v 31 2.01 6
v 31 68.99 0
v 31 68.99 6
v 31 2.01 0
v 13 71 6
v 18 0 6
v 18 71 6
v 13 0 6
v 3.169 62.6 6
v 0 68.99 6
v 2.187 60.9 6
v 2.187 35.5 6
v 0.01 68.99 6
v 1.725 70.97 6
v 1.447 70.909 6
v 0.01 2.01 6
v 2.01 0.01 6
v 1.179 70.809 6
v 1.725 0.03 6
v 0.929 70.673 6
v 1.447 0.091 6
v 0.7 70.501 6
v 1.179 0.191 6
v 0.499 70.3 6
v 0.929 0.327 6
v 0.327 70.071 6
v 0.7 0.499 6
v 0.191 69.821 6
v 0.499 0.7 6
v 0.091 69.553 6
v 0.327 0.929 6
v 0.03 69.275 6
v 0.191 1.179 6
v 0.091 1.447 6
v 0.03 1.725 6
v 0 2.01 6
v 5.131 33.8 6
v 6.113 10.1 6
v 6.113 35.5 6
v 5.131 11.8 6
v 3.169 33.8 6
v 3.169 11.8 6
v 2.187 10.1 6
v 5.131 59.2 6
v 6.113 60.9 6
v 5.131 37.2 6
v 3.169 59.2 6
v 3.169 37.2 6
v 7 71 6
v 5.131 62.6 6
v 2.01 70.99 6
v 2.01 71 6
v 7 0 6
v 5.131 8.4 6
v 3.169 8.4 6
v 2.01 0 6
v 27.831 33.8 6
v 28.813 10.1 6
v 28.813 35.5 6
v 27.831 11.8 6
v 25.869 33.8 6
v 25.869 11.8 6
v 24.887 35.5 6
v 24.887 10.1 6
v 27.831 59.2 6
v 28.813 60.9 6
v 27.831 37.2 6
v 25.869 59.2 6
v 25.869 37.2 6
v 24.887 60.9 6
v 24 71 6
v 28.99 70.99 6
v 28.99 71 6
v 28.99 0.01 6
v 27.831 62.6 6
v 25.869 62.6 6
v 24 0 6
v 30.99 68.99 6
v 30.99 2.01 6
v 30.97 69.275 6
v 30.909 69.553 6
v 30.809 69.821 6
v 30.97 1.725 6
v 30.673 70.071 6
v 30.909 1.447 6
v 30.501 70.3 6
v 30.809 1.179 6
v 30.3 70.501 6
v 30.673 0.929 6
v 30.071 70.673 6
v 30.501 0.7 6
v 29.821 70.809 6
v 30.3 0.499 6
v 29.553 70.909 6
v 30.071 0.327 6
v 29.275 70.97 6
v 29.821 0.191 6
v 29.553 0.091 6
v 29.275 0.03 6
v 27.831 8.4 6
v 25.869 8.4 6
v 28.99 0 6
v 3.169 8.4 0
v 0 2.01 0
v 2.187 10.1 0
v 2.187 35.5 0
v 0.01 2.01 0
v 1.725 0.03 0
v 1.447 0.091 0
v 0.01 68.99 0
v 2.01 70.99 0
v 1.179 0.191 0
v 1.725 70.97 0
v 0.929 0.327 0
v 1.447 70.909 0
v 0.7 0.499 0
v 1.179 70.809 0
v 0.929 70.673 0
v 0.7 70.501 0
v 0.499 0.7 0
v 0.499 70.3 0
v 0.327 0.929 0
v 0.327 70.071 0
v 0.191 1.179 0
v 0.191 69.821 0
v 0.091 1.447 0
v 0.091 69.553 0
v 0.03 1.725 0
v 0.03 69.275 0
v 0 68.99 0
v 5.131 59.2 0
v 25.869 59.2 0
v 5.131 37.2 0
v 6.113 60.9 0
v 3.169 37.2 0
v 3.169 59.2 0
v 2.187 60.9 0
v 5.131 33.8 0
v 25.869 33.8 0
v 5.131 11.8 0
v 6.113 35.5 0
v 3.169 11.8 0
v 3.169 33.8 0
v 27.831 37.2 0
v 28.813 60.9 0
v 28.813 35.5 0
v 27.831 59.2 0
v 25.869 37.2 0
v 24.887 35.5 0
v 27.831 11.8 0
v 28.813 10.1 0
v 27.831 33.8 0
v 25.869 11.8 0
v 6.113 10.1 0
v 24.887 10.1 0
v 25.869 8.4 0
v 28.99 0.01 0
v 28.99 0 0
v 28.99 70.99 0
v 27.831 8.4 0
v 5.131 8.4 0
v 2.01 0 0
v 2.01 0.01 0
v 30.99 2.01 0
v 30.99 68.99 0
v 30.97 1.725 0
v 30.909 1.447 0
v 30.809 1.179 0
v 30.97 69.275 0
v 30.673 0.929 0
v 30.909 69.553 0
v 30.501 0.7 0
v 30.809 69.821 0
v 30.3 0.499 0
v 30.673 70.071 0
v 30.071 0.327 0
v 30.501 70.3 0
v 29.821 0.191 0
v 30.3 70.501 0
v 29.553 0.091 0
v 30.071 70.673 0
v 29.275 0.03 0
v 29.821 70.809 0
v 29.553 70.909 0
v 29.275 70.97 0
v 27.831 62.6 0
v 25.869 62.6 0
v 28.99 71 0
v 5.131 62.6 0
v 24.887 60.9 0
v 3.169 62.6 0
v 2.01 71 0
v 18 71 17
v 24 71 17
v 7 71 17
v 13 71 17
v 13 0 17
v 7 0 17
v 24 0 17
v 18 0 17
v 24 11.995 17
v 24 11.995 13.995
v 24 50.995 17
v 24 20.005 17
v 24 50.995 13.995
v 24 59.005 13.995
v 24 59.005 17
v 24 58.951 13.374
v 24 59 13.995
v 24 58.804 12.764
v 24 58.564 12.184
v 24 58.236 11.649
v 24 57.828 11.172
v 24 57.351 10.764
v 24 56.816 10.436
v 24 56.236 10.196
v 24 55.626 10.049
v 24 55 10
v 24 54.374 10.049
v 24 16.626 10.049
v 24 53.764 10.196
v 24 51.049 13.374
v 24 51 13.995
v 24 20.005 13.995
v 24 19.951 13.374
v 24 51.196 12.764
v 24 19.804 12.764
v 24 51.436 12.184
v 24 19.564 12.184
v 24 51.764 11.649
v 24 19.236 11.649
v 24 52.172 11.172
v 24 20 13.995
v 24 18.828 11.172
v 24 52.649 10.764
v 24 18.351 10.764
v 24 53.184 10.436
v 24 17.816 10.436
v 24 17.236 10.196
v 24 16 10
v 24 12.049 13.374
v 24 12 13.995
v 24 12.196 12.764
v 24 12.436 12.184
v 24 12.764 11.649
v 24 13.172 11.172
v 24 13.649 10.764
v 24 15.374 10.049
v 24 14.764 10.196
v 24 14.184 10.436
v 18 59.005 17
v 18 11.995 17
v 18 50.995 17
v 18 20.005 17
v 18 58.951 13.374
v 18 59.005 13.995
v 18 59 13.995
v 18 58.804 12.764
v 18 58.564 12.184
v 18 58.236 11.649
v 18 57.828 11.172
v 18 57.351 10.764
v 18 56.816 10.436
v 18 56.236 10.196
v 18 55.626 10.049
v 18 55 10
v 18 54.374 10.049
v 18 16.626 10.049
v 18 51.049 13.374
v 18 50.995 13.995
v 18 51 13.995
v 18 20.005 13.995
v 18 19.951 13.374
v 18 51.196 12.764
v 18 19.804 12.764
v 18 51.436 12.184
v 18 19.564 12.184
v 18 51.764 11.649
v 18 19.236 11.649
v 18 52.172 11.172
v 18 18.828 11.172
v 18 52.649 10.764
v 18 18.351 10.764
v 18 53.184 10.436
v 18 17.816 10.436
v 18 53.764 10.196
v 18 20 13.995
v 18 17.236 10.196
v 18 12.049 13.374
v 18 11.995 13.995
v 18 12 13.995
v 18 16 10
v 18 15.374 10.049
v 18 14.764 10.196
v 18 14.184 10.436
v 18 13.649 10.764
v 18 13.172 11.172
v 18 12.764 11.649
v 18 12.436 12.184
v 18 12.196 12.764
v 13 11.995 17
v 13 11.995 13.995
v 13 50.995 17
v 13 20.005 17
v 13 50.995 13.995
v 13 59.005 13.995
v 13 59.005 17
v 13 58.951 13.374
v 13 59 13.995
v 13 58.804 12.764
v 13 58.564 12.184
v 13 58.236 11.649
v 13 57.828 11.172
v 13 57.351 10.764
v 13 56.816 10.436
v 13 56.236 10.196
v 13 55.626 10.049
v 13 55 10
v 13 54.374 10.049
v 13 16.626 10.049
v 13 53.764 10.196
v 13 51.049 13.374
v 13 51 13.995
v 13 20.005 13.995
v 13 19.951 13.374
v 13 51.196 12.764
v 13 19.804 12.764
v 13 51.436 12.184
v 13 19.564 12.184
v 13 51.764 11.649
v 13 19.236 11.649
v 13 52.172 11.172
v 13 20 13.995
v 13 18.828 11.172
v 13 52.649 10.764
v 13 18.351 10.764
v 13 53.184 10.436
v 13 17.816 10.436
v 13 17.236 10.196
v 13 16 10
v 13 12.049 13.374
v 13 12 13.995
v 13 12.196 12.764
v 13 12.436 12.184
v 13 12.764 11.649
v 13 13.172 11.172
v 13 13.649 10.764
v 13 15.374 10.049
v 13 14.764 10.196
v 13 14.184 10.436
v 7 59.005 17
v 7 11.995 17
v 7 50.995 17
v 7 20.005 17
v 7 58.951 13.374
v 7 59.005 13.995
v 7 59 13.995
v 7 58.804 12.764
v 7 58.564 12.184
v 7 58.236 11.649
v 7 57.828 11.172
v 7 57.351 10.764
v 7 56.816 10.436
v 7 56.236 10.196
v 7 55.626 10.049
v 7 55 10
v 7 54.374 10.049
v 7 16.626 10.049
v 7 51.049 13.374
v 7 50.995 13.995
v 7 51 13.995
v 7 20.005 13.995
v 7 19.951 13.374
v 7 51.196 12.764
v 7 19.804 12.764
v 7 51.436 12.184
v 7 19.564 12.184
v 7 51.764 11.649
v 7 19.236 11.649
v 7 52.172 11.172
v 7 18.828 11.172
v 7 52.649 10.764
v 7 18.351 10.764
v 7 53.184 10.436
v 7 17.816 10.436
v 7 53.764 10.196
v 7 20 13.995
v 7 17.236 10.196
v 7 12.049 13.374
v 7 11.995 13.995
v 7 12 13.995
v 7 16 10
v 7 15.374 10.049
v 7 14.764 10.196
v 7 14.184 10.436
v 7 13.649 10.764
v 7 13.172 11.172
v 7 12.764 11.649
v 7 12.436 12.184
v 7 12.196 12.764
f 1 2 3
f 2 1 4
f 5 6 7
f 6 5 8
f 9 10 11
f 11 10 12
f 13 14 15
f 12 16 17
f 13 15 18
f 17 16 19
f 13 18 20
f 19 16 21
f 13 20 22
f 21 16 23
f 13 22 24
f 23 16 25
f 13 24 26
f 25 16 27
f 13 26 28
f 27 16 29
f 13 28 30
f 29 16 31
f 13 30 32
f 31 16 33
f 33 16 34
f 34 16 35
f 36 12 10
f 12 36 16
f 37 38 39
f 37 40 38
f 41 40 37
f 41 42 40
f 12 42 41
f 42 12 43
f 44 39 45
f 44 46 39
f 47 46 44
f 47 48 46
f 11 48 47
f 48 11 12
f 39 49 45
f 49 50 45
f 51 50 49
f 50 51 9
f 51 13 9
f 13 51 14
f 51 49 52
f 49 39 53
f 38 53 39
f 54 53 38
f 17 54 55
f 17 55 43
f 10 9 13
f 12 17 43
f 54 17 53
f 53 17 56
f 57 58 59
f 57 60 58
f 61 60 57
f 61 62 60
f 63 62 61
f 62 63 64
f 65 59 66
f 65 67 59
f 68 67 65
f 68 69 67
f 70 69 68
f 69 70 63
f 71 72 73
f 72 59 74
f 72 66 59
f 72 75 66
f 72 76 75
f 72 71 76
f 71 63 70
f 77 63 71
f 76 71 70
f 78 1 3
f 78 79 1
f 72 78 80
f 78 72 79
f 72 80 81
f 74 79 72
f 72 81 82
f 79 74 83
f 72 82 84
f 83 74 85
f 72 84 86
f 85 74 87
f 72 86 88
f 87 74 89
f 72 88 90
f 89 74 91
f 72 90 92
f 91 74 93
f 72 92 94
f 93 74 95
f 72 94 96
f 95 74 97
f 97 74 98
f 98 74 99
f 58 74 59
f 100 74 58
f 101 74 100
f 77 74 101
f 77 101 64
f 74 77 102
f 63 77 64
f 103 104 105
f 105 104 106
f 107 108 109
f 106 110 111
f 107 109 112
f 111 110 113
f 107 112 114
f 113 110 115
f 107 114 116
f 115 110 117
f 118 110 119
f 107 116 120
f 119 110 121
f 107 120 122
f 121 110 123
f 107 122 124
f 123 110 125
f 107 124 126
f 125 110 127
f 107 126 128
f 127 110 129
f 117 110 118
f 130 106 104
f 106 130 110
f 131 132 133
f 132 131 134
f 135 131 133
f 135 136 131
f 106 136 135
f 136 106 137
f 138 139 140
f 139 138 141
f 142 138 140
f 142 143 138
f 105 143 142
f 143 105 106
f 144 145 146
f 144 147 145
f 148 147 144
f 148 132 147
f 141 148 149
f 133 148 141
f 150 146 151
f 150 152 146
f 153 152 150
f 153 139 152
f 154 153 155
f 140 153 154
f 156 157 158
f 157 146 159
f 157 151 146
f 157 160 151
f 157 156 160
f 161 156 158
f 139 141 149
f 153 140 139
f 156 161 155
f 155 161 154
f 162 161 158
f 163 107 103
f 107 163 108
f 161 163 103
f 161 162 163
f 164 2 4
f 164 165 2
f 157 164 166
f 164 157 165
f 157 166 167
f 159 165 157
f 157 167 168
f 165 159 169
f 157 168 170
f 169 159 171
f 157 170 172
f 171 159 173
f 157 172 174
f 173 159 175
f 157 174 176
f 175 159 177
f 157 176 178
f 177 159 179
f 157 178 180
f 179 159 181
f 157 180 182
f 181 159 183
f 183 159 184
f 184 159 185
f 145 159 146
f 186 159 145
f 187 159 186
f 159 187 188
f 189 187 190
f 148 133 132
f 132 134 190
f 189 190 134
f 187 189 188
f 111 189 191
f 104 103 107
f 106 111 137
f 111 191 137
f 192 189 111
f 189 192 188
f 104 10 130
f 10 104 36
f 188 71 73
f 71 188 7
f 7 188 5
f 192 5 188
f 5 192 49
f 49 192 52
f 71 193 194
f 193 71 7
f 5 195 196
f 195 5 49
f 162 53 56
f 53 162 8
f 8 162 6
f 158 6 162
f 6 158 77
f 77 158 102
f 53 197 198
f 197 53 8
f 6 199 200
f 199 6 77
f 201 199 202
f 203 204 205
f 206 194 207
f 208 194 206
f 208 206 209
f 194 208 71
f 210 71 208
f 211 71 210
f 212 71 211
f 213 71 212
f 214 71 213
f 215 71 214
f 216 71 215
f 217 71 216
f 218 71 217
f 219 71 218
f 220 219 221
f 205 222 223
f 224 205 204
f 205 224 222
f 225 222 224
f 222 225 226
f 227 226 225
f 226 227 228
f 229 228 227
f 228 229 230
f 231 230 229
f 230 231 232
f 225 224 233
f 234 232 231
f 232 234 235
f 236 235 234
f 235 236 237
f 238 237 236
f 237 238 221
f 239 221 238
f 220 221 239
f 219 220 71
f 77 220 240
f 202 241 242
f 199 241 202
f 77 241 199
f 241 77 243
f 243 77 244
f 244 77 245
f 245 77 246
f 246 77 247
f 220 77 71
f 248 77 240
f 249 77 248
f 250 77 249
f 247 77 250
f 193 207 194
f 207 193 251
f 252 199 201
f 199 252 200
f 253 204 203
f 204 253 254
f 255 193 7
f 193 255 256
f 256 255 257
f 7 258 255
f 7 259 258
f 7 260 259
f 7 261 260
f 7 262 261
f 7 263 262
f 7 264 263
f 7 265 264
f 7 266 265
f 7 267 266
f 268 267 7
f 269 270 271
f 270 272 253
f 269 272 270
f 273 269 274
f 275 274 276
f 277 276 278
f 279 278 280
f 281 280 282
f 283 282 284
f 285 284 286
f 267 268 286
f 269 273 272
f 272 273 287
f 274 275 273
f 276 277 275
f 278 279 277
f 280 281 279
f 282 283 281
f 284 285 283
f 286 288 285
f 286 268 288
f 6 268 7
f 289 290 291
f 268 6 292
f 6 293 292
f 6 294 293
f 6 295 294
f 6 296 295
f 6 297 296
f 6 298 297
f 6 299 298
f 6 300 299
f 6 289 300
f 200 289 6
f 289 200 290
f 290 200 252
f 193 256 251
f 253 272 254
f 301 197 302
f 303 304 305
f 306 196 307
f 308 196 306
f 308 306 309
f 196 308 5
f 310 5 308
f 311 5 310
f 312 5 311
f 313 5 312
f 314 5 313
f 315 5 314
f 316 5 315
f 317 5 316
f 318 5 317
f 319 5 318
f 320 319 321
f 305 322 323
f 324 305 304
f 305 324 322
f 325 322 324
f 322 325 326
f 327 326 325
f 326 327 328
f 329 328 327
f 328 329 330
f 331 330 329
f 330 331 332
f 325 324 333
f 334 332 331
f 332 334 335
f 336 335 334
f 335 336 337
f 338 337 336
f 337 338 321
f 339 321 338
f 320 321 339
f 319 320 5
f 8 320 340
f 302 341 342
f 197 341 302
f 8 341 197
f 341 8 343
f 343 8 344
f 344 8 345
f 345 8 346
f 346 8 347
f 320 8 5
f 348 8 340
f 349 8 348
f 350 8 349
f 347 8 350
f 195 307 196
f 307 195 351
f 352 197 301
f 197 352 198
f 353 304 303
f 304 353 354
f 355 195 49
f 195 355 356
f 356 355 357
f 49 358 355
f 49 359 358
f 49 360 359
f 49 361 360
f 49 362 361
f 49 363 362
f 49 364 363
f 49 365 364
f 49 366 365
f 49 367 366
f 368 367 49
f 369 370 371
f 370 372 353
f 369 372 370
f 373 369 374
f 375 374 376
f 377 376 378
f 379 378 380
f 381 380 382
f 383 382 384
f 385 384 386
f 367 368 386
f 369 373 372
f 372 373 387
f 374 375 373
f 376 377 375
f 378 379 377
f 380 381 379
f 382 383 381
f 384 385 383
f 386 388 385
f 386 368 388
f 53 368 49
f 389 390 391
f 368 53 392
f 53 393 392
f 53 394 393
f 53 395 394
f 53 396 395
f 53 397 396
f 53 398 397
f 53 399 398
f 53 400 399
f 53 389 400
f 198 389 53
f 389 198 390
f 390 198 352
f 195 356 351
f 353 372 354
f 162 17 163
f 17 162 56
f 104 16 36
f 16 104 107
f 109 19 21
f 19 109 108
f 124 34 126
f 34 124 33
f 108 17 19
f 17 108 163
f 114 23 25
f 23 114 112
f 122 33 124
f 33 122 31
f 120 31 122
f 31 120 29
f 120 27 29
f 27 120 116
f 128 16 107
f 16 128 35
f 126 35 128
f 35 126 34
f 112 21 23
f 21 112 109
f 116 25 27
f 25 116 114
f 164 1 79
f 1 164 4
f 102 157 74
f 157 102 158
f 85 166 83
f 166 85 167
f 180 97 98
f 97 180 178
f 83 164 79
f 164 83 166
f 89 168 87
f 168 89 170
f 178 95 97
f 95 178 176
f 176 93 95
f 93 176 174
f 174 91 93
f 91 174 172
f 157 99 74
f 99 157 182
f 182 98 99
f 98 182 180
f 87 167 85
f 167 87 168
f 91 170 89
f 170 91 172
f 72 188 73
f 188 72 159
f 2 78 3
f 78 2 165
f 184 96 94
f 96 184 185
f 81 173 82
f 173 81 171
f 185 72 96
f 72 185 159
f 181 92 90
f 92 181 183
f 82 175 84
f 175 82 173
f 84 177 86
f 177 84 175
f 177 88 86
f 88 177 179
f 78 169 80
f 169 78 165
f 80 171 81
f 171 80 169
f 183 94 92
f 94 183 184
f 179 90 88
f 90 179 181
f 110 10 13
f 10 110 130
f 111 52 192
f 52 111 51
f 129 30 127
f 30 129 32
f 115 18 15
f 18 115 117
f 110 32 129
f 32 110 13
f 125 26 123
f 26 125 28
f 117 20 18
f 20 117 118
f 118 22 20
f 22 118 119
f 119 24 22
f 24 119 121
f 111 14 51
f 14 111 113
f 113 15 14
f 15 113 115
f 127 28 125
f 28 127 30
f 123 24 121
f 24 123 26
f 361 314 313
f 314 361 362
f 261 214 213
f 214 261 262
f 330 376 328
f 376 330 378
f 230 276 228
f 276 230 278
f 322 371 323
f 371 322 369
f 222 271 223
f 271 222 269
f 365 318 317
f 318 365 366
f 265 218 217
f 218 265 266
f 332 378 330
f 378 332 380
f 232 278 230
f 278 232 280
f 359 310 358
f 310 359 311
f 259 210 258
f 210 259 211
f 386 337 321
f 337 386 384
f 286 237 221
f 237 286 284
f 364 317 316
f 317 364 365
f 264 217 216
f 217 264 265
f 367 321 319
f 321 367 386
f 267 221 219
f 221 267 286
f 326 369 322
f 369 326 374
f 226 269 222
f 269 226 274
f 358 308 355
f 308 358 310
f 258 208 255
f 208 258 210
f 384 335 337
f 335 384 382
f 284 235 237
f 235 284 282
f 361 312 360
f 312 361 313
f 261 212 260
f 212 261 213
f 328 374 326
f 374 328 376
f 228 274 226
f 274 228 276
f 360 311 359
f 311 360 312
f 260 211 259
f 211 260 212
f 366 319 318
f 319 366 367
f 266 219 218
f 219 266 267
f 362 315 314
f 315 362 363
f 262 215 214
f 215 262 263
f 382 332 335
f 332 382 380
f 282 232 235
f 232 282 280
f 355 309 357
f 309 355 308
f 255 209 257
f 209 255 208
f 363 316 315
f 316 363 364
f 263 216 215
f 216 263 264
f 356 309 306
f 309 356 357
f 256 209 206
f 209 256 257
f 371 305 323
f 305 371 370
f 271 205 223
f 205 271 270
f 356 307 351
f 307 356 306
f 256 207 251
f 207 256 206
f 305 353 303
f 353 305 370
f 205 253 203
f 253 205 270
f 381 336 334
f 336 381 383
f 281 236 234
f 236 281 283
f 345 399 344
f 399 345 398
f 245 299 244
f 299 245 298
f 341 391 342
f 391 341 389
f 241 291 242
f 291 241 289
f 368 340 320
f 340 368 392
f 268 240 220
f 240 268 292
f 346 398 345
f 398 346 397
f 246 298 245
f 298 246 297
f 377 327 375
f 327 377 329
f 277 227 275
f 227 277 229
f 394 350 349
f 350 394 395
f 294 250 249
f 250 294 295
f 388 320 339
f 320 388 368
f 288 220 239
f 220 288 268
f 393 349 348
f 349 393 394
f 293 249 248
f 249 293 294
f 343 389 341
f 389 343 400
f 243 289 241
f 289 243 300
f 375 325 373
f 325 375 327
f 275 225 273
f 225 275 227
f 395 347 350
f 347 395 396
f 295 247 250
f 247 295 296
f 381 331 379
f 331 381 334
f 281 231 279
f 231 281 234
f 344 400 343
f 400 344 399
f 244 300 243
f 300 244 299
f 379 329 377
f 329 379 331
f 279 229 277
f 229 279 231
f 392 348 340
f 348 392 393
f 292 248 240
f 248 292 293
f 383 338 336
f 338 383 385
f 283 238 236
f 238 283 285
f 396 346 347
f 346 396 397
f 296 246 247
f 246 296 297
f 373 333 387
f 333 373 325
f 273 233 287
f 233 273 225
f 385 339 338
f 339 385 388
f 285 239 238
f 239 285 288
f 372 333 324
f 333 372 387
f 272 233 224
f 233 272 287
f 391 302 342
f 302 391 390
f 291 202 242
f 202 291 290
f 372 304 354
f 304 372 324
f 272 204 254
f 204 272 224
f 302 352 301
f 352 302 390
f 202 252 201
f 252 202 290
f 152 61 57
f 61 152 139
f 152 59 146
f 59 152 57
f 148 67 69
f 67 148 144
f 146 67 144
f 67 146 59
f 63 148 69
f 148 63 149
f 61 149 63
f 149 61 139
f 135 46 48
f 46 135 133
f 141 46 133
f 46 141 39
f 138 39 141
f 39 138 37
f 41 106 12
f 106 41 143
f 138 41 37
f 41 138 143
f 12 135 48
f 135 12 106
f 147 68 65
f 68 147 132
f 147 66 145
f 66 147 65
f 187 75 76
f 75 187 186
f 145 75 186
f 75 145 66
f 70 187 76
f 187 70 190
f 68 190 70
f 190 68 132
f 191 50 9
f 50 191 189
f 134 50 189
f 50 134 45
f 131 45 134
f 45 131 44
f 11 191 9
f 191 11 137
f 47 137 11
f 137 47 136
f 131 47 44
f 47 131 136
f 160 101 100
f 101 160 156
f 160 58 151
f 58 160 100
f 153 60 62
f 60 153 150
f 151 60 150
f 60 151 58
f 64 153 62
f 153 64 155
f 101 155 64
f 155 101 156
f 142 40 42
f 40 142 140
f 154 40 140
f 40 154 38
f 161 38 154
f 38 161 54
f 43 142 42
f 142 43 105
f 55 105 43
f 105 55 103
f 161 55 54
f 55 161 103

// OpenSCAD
// file: obiscad/attach.scad
//---------------------------------------------------------------
//-- Openscad Attachment library
//-- Attach parts easily. Make your designs more reusable and clean
//---------------------------------------------------------------
//-- This is a component of the obiscad opescad tools by Obijuan
//-- (C) Juan Gonzalez-Gomez (Obijuan)
//-- Sep-2012
//---------------------------------------------------------------
//-- Released under the GPL license
//---------------------------------------------------------------

use <vector.scad>

//--------------------------------------------------------------------
//-- Draw a connector
//-- A connector is defined a 3-tuple that consist of a point
//--- (the attachment point), and axis (the attachment axis) and
//--- an angle the connected part should be rotate around the 
//--  attachment axis
//--
//--- Input parameters:
//--
//--  Connector c = [p , n, ang] where:
//--
//--     p : The attachment point
//--     v : The attachment axis
//--   ang : the angle
//--------------------------------------------------------------------
module connector(c)
{
  //-- Get the three components from the connector
  p = c[0];
  v = c[1];
  ang = c[2];

  //-- Draw the attachment poing
  color("Gray") point(p);

  //-- Draw the attachment axis vector (with a mark)
  translate(p)
    rotate(a=ang, v=v)
    color("Gray") vector(unitv(v)*6, l_arrow=2, mark=true);
}


//-------------------------------------------------------------------------
//--  ATTACH OPERATOR
//--  This operator applies the necesary transformations to the 
//--  child (attachable part) so that it is attached to the main part
//--  
//--  Parameters
//--    a -> Connector of the main part
//--    b -> Connector of the attachable part
//-------------------------------------------------------------------------
module attach(a,b)
{
  //-- Get the data from the connectors
  pos1 = a[0];  //-- Attachment point. Main part
  v    = a[1];  //-- Attachment axis. Main part
  roll = a[2];  //-- Rolling angle
  
  pos2 = b[0];  //-- Attachment point. Attachable part
  vref = b[1];  //-- Atachment axis. Attachable part
                //-- The rolling angle of the attachable part is not used

  //-------- Calculations for the "orientate operator"------
  //-- Calculate the rotation axis
  raxis = cross(vref,v);
    
  //-- Calculate the angle between the vectors
  ang = anglev(vref,v);
  //--------------------------------------------------------.-

  //-- Apply the transformations to the child ---------------------------

  //-- Place the attachable part on the main part attachment point
  translate(pos1)
    //-- Orientate operator. Apply the orientation so that
    //-- both attachment axis are paralell. Also apply the roll angle
    rotate(a=roll, v=v)  rotate(a=ang, v=raxis)
      //-- Attachable part to the origin
      translate(-pos2)
	child(0); 
}


//--------------------------------------------------------------------
//---   An example of the attach operator
//---  
//---  There are two parts: the main body and an arm
//---  They both are cubes (for simplicity)
//---
//--   In the main body there are 2 connectors defined, so that
//--  the arm can be attached to any of them (or both if you like)
//------------------------------------------------------------------

//-- In the debug mode the connectors and additional information
//-- are shown
debug=true;

//-- Define the Main part: A cube
//-- Two attachment points are defined: one on the top, another in the
//--- left side
size = [10,10,10];

//-- Connectors defined:

//--     Att. point       Att. Axis  Roll
c1 = [ [0,0,size[2]/2],  [0,0,1],     20];  //-- Connector on the top
c2 = [ [-size[0]/2,0,0], [-1,0,0],    90];  //-- Connector on the left


//-- Draw the main part along with the connectors (for debugging)
cube(size,center=true);

//-- In debug mode: Draw the main part connectors!
if (debug) {
  connector(c1);
  connector(c2);
}

//-- Define the Attachable part. It is another cube, with one connector
asize = [5,20,3];
a = [ [0,asize[1]/2-3,-asize[2]/2], [0,0,1], 0  ];


//-- Do the attach!
//-- Just change c1 by c2 to attach the part to the other 
//-- connector. Super-easy!! :-)
//-- Modify the c1 and c2 roll angle for rotating the attachable
//--  part to the desired orientation
attach(c1,a)
  //-- This is the attachable part! 
  union() {
    cube(asize,center=true);  //-- The part

    //-- In debug mode show additional info:
    if (debug) {
      frame(l=10);    //-- The part frame of reference.
      connector(a);   //-- Show the part connector
    }
  };

  
// main file
use <obiscad/bevel.scad>
use <obiscad/attach.scad>

block = [31,71,6];
holder = [6, block[1], 11];

holder_spacing = 11;
rod_spacing = 39;
rod_offset = 3;
mo	= 0.01;

m8 = 8;
us_nut = 3.4;

da6 = 1/cos(180/6)/2;

nut_hole_d = us_nut * da6;
nut_offset = 11.35;
nut_spacing = 25.4;

rod_holes = [	[holder_spacing/2,rod_spacing/2],
					[holder_spacing/2,-rod_spacing/2]					
];

nut_holes = [	[block[0]/2 + nut_offset,block[1]/2],
					[block[0]/2 - nut_offset,block[1]/2],
					[block[0]/2 + nut_offset,block[1]/2 + nut_spacing],
					[block[0]/2 - nut_offset,block[1]/2 + nut_spacing],
					[block[0]/2 + nut_offset,block[1]/2 - nut_spacing],
					[block[0]/2 - nut_offset,block[1]/2 - nut_spacing]
];

//-- Top-right beveling (rounded)
ec1 = [ [0, 0, block[2]/2], [0,0,1], 0];
en1 = [ ec1[0],                    [-1,-1,0], 0];
bevel_radius = 2;
bevel_res = 10;

*connector(ec1);
*connector(en1);

difference()
{
	union()
	{
		cube(block);

		translate([block[0]/2-holder[0]/2 + holder_spacing/2,0,block[2]])
			cube(holder);

		translate([block[0]/2-holder[0]/2 - holder_spacing/2,0,block[2]])
			cube(holder);
	}

	union()
	{
		bevel(ec1, en1, cr = bevel_radius, cres=bevel_res, l=block[2]+mo);

		translate([block[0],0,0])
		rotate([0,0,90])	
		bevel(ec1, en1, cr = bevel_radius, cres=bevel_res, l=block[2]+mo);

		translate([block[0],block[1],0])
		rotate([0,0,180])	
		bevel(ec1, en1, cr = bevel_radius, cres=bevel_res, l=block[2]+mo);

		translate([0,block[1],0])
		rotate([0,0,270])	
		bevel(ec1, en1, cr = bevel_radius, cres=bevel_res, l=block[2]+mo);

		#for (hole = rod_holes)
		{	
			translate([-10,block[1]/2 + hole[1],block[2]+holder[2]-rod_offset])
			rotate([0,90,0])
				#cylinder(r=m8/2,h=50,$fn=40);

			translate([10,block[1]/2 + hole[1],block[2]+holder[2]-rod_offset])
				translate([3,0,m8/2])
				cube([60,8+mo,8+mo], center=true);
		}
		
		#for (hole = nut_holes)
		{
			translate([hole[0],hole[1],-mo])
			cylinder(r=nut_hole_d, h=30, $fn=6);
		}
	}
}
